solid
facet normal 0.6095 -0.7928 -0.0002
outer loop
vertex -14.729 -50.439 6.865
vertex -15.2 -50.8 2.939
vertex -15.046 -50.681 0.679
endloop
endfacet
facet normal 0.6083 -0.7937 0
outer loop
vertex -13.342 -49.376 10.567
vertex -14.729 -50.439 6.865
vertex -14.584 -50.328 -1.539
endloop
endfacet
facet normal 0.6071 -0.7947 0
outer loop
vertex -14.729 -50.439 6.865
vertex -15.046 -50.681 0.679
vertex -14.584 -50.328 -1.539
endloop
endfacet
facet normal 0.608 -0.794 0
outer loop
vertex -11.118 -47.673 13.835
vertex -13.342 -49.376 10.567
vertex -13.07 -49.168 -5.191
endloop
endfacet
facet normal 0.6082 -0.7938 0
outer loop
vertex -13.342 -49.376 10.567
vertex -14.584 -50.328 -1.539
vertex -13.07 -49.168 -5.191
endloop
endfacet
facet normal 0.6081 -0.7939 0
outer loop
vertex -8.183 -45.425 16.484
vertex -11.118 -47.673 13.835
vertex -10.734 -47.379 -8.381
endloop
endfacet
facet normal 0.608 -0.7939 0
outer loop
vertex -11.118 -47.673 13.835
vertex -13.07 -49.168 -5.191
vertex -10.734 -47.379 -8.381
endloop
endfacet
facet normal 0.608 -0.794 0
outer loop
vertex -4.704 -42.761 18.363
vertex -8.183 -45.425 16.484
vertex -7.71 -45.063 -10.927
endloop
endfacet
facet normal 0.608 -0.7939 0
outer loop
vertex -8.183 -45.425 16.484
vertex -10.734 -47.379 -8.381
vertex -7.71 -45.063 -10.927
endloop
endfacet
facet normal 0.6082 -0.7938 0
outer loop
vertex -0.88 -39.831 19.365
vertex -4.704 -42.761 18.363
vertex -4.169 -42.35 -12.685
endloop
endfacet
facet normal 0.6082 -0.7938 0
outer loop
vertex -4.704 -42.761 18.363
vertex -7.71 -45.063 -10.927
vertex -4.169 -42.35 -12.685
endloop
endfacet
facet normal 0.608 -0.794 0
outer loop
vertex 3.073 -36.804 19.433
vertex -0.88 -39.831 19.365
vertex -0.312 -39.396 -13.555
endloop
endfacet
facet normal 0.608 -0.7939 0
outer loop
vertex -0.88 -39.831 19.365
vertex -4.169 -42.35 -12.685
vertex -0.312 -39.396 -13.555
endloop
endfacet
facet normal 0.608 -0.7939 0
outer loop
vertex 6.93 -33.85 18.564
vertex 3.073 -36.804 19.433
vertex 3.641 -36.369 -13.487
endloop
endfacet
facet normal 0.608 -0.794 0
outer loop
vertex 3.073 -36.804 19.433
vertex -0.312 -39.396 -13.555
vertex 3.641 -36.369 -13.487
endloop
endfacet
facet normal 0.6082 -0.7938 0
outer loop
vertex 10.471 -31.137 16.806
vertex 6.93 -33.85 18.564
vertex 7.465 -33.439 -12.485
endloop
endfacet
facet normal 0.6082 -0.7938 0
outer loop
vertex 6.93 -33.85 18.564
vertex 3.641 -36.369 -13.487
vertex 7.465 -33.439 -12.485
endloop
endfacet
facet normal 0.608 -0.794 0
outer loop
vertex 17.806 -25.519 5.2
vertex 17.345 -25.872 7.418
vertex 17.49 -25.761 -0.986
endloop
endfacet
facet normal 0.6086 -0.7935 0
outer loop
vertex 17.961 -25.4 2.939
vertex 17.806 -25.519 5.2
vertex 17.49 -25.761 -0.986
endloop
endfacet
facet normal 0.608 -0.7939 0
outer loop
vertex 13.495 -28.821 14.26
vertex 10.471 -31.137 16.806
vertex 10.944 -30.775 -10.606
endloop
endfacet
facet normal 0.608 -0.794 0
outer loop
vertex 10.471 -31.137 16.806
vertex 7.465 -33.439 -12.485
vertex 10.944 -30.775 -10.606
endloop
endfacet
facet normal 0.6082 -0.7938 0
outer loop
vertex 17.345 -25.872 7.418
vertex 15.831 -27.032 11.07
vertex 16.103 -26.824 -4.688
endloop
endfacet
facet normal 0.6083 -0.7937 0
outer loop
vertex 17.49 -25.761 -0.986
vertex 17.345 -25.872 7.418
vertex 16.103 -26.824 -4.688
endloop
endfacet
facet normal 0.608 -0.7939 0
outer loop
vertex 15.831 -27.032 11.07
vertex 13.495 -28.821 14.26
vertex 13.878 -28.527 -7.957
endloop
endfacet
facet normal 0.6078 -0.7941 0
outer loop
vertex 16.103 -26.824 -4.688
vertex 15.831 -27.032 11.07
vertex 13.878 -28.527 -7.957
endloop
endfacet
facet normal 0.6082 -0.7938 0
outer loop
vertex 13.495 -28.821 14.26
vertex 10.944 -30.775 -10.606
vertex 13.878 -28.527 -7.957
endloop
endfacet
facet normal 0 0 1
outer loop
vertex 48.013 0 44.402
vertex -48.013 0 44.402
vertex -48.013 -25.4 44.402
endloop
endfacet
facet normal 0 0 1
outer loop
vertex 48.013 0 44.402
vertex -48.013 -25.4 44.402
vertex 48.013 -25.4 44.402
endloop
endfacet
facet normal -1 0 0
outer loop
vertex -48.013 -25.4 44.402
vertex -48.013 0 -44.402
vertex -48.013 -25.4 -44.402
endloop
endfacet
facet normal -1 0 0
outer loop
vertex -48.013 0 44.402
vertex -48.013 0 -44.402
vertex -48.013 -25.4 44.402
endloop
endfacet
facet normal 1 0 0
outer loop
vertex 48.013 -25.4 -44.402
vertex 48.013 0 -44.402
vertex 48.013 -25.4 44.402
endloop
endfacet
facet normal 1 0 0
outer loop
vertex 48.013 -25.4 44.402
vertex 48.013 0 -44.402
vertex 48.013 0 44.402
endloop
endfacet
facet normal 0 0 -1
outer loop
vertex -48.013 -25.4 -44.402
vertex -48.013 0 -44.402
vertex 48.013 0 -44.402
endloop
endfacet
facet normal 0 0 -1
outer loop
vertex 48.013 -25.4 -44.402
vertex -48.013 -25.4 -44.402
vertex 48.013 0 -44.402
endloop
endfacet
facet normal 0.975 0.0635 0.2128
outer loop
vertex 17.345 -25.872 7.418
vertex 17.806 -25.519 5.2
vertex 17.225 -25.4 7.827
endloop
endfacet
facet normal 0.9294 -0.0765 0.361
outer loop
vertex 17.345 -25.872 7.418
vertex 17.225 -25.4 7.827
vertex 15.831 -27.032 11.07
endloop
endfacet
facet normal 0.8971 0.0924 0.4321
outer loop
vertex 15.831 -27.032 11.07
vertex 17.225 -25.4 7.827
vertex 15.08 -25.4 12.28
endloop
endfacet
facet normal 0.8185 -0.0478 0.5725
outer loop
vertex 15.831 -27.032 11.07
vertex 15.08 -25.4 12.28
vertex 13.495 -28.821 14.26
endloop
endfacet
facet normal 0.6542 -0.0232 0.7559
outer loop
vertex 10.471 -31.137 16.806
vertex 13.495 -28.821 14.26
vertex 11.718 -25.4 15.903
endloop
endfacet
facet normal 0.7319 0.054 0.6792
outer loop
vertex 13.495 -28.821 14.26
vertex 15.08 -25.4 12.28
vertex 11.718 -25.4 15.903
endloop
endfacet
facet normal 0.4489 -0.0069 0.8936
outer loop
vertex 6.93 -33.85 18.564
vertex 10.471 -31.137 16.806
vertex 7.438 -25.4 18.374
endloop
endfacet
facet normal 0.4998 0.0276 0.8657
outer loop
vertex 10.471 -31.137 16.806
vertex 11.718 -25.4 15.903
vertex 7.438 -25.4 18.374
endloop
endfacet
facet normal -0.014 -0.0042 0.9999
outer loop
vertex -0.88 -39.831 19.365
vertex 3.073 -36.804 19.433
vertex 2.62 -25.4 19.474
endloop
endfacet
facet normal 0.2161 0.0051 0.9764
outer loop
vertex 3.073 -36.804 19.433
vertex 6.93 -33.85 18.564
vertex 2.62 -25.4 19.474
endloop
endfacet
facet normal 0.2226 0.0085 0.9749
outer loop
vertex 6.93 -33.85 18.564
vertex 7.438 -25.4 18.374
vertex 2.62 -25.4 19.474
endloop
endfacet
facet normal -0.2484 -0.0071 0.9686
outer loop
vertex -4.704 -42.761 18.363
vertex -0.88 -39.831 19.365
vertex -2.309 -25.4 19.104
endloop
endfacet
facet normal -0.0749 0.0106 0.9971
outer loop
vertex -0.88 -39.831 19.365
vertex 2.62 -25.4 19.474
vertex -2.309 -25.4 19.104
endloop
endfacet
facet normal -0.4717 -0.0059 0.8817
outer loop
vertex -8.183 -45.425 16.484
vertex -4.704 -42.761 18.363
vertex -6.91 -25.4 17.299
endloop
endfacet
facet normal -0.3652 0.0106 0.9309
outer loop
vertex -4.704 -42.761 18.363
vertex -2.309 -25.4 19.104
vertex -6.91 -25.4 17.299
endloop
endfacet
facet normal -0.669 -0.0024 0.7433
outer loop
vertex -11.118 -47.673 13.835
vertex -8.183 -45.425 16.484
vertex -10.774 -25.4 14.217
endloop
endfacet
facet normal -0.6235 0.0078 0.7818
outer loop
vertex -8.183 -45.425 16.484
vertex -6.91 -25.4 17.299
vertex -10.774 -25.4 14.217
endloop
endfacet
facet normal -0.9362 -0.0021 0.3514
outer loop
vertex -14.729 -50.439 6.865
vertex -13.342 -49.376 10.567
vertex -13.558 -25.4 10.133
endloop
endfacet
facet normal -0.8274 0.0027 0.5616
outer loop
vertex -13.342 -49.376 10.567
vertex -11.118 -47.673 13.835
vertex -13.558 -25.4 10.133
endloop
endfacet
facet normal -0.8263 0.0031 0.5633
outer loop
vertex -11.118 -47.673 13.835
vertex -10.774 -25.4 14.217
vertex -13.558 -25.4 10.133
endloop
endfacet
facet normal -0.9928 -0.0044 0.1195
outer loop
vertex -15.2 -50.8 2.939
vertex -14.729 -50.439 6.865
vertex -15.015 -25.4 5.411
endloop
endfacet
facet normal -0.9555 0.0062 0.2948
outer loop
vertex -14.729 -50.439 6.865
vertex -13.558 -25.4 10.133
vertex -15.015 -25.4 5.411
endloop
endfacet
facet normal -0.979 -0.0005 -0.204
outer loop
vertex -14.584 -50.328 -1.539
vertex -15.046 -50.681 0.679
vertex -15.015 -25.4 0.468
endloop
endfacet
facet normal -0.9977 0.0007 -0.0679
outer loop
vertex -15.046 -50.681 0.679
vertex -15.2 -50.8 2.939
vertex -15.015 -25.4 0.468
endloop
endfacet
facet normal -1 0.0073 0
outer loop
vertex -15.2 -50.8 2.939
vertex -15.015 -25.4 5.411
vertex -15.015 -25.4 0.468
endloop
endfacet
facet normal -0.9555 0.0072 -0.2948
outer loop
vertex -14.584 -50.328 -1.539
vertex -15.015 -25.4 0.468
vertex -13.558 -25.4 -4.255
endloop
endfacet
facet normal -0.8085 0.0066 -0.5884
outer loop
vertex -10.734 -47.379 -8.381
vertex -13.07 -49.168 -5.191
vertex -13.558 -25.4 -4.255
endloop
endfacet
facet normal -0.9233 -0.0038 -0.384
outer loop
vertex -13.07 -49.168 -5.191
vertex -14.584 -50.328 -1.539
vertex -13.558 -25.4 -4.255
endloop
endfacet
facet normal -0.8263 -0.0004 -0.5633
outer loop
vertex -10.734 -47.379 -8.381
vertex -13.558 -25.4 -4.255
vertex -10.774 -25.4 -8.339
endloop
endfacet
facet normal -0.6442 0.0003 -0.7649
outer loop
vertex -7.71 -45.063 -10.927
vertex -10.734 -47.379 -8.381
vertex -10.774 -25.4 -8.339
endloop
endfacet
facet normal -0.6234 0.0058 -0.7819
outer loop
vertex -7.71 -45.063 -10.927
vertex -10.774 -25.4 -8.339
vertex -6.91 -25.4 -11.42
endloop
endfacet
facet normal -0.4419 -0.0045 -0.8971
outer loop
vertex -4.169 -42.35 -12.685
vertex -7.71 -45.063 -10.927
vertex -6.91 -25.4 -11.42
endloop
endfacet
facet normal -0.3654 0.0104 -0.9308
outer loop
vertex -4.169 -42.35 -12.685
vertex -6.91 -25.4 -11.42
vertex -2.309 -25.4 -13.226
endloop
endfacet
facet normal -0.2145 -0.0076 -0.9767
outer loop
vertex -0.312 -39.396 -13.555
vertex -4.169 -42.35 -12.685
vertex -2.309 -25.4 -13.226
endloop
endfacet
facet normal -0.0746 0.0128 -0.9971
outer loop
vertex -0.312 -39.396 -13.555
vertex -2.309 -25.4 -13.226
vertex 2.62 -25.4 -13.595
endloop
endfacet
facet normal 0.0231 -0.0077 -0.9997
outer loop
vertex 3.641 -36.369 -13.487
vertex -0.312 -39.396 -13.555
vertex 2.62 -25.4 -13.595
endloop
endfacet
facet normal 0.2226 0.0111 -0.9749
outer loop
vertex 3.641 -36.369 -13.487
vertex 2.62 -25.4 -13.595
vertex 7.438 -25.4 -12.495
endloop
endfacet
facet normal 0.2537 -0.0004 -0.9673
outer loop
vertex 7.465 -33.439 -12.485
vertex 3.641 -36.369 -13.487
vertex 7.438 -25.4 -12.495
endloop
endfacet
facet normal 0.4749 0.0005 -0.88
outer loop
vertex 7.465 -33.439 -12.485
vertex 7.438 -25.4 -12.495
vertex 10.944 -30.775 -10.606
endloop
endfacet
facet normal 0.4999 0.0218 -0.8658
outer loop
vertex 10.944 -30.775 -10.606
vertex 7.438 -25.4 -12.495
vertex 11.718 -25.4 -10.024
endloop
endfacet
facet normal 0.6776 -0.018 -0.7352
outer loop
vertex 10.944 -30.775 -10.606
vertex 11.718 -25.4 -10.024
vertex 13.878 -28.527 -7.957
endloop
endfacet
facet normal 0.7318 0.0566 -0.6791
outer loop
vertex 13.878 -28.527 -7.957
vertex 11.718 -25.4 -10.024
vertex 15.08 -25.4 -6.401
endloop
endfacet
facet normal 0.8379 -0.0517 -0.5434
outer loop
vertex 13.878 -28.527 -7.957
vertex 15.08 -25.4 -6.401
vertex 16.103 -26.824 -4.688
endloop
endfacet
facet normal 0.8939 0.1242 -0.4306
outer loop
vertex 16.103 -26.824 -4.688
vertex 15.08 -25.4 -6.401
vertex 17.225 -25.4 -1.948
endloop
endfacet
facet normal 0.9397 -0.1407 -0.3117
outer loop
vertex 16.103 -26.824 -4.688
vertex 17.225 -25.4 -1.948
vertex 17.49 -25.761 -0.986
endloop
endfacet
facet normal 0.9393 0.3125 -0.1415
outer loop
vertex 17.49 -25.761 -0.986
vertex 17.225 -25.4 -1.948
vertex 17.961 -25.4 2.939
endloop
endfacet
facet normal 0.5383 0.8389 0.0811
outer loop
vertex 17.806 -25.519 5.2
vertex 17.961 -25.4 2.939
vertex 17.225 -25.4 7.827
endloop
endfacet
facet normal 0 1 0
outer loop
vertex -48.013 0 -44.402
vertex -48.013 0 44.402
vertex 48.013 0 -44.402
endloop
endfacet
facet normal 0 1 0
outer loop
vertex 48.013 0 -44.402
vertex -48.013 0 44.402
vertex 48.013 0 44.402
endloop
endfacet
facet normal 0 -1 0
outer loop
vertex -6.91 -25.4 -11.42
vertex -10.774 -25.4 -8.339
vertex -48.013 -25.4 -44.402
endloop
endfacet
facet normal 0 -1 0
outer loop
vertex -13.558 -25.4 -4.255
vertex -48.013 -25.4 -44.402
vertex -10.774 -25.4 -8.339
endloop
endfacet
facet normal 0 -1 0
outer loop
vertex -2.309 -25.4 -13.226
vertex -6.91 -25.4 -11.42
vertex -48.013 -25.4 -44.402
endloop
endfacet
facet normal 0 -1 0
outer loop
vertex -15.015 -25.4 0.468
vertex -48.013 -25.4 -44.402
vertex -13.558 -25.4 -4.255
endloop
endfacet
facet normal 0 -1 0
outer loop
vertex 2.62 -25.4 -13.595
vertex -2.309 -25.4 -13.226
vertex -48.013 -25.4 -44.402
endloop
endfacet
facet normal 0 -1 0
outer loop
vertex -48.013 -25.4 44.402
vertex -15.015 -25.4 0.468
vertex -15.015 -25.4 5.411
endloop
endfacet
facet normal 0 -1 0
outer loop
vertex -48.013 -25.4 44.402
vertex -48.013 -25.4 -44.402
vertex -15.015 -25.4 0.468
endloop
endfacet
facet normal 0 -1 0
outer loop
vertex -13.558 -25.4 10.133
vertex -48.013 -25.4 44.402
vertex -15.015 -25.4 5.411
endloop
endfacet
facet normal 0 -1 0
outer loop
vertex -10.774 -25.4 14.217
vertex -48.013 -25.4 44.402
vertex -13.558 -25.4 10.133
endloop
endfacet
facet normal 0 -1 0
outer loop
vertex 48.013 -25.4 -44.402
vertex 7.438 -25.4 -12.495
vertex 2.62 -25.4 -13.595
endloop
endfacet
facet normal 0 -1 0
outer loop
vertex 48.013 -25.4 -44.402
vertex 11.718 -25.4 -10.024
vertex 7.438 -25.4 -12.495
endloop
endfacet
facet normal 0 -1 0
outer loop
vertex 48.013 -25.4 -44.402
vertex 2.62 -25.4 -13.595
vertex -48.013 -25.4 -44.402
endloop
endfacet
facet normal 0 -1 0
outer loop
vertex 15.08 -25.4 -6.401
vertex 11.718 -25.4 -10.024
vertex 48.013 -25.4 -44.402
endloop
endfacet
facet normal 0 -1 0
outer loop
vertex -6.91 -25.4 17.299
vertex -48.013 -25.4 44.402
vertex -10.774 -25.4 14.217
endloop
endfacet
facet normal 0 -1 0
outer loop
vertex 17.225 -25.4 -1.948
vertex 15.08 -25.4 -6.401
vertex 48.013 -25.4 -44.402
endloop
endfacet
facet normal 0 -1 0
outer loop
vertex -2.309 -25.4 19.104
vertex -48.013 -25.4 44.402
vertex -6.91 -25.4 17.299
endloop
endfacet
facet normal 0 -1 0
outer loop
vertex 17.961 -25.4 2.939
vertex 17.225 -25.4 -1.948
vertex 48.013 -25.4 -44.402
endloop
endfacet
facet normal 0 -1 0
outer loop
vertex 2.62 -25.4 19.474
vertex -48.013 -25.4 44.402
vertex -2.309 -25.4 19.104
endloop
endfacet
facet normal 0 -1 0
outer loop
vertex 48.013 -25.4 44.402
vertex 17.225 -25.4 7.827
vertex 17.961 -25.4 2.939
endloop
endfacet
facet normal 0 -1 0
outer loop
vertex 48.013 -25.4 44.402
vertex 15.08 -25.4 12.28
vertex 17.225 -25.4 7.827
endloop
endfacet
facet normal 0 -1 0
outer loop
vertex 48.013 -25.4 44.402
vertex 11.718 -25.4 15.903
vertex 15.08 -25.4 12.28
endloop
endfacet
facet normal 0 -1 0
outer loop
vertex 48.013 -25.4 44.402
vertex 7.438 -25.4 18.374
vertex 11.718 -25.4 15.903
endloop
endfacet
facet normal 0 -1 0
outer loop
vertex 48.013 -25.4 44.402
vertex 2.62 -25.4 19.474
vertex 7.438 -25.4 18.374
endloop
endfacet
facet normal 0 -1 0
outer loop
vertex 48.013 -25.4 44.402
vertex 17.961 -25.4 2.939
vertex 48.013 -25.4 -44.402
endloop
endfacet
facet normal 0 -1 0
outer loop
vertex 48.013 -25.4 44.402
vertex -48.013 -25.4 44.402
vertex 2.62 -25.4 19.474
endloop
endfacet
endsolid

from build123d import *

# Parameters (mm, degrees)
F0_W     = 96.026704
F0_H     = 88.803456
F1_DEPTH = 25.4
F2_R     = 16.580818
F3_DEPTH = 25.4
F5_DEPTH = 88.804455


with BuildPart() as f1:
    # F0 (on Front) → F1 (new body)
    with BuildSketch(Plane.XZ):
        Rectangle(F0_W, F0_H)
    extrude(amount=F1_DEPTH)

    # F2 (on face) → F3 (join)
    with BuildSketch(Plane.XZ.offset(25.4)):
        with Locations((1.380454, 2.939289)):
            Circle(F2_R)
    extrude(amount=F3_DEPTH)

    # F4 (on face) → F5 (cut, through all)
    with BuildSketch(Plane(origin=(0, 0, -44.401728), x_dir=(1, 0, 0), z_dir=(0, 0, -1))):
        Polygon((17.961273, 50.8), (-15.200364, 50.8), (17.961273, 25.4), align=None)
    extrude(amount=-F5_DEPTH, mode=Mode.SUBTRACT)


solid = f1.part
